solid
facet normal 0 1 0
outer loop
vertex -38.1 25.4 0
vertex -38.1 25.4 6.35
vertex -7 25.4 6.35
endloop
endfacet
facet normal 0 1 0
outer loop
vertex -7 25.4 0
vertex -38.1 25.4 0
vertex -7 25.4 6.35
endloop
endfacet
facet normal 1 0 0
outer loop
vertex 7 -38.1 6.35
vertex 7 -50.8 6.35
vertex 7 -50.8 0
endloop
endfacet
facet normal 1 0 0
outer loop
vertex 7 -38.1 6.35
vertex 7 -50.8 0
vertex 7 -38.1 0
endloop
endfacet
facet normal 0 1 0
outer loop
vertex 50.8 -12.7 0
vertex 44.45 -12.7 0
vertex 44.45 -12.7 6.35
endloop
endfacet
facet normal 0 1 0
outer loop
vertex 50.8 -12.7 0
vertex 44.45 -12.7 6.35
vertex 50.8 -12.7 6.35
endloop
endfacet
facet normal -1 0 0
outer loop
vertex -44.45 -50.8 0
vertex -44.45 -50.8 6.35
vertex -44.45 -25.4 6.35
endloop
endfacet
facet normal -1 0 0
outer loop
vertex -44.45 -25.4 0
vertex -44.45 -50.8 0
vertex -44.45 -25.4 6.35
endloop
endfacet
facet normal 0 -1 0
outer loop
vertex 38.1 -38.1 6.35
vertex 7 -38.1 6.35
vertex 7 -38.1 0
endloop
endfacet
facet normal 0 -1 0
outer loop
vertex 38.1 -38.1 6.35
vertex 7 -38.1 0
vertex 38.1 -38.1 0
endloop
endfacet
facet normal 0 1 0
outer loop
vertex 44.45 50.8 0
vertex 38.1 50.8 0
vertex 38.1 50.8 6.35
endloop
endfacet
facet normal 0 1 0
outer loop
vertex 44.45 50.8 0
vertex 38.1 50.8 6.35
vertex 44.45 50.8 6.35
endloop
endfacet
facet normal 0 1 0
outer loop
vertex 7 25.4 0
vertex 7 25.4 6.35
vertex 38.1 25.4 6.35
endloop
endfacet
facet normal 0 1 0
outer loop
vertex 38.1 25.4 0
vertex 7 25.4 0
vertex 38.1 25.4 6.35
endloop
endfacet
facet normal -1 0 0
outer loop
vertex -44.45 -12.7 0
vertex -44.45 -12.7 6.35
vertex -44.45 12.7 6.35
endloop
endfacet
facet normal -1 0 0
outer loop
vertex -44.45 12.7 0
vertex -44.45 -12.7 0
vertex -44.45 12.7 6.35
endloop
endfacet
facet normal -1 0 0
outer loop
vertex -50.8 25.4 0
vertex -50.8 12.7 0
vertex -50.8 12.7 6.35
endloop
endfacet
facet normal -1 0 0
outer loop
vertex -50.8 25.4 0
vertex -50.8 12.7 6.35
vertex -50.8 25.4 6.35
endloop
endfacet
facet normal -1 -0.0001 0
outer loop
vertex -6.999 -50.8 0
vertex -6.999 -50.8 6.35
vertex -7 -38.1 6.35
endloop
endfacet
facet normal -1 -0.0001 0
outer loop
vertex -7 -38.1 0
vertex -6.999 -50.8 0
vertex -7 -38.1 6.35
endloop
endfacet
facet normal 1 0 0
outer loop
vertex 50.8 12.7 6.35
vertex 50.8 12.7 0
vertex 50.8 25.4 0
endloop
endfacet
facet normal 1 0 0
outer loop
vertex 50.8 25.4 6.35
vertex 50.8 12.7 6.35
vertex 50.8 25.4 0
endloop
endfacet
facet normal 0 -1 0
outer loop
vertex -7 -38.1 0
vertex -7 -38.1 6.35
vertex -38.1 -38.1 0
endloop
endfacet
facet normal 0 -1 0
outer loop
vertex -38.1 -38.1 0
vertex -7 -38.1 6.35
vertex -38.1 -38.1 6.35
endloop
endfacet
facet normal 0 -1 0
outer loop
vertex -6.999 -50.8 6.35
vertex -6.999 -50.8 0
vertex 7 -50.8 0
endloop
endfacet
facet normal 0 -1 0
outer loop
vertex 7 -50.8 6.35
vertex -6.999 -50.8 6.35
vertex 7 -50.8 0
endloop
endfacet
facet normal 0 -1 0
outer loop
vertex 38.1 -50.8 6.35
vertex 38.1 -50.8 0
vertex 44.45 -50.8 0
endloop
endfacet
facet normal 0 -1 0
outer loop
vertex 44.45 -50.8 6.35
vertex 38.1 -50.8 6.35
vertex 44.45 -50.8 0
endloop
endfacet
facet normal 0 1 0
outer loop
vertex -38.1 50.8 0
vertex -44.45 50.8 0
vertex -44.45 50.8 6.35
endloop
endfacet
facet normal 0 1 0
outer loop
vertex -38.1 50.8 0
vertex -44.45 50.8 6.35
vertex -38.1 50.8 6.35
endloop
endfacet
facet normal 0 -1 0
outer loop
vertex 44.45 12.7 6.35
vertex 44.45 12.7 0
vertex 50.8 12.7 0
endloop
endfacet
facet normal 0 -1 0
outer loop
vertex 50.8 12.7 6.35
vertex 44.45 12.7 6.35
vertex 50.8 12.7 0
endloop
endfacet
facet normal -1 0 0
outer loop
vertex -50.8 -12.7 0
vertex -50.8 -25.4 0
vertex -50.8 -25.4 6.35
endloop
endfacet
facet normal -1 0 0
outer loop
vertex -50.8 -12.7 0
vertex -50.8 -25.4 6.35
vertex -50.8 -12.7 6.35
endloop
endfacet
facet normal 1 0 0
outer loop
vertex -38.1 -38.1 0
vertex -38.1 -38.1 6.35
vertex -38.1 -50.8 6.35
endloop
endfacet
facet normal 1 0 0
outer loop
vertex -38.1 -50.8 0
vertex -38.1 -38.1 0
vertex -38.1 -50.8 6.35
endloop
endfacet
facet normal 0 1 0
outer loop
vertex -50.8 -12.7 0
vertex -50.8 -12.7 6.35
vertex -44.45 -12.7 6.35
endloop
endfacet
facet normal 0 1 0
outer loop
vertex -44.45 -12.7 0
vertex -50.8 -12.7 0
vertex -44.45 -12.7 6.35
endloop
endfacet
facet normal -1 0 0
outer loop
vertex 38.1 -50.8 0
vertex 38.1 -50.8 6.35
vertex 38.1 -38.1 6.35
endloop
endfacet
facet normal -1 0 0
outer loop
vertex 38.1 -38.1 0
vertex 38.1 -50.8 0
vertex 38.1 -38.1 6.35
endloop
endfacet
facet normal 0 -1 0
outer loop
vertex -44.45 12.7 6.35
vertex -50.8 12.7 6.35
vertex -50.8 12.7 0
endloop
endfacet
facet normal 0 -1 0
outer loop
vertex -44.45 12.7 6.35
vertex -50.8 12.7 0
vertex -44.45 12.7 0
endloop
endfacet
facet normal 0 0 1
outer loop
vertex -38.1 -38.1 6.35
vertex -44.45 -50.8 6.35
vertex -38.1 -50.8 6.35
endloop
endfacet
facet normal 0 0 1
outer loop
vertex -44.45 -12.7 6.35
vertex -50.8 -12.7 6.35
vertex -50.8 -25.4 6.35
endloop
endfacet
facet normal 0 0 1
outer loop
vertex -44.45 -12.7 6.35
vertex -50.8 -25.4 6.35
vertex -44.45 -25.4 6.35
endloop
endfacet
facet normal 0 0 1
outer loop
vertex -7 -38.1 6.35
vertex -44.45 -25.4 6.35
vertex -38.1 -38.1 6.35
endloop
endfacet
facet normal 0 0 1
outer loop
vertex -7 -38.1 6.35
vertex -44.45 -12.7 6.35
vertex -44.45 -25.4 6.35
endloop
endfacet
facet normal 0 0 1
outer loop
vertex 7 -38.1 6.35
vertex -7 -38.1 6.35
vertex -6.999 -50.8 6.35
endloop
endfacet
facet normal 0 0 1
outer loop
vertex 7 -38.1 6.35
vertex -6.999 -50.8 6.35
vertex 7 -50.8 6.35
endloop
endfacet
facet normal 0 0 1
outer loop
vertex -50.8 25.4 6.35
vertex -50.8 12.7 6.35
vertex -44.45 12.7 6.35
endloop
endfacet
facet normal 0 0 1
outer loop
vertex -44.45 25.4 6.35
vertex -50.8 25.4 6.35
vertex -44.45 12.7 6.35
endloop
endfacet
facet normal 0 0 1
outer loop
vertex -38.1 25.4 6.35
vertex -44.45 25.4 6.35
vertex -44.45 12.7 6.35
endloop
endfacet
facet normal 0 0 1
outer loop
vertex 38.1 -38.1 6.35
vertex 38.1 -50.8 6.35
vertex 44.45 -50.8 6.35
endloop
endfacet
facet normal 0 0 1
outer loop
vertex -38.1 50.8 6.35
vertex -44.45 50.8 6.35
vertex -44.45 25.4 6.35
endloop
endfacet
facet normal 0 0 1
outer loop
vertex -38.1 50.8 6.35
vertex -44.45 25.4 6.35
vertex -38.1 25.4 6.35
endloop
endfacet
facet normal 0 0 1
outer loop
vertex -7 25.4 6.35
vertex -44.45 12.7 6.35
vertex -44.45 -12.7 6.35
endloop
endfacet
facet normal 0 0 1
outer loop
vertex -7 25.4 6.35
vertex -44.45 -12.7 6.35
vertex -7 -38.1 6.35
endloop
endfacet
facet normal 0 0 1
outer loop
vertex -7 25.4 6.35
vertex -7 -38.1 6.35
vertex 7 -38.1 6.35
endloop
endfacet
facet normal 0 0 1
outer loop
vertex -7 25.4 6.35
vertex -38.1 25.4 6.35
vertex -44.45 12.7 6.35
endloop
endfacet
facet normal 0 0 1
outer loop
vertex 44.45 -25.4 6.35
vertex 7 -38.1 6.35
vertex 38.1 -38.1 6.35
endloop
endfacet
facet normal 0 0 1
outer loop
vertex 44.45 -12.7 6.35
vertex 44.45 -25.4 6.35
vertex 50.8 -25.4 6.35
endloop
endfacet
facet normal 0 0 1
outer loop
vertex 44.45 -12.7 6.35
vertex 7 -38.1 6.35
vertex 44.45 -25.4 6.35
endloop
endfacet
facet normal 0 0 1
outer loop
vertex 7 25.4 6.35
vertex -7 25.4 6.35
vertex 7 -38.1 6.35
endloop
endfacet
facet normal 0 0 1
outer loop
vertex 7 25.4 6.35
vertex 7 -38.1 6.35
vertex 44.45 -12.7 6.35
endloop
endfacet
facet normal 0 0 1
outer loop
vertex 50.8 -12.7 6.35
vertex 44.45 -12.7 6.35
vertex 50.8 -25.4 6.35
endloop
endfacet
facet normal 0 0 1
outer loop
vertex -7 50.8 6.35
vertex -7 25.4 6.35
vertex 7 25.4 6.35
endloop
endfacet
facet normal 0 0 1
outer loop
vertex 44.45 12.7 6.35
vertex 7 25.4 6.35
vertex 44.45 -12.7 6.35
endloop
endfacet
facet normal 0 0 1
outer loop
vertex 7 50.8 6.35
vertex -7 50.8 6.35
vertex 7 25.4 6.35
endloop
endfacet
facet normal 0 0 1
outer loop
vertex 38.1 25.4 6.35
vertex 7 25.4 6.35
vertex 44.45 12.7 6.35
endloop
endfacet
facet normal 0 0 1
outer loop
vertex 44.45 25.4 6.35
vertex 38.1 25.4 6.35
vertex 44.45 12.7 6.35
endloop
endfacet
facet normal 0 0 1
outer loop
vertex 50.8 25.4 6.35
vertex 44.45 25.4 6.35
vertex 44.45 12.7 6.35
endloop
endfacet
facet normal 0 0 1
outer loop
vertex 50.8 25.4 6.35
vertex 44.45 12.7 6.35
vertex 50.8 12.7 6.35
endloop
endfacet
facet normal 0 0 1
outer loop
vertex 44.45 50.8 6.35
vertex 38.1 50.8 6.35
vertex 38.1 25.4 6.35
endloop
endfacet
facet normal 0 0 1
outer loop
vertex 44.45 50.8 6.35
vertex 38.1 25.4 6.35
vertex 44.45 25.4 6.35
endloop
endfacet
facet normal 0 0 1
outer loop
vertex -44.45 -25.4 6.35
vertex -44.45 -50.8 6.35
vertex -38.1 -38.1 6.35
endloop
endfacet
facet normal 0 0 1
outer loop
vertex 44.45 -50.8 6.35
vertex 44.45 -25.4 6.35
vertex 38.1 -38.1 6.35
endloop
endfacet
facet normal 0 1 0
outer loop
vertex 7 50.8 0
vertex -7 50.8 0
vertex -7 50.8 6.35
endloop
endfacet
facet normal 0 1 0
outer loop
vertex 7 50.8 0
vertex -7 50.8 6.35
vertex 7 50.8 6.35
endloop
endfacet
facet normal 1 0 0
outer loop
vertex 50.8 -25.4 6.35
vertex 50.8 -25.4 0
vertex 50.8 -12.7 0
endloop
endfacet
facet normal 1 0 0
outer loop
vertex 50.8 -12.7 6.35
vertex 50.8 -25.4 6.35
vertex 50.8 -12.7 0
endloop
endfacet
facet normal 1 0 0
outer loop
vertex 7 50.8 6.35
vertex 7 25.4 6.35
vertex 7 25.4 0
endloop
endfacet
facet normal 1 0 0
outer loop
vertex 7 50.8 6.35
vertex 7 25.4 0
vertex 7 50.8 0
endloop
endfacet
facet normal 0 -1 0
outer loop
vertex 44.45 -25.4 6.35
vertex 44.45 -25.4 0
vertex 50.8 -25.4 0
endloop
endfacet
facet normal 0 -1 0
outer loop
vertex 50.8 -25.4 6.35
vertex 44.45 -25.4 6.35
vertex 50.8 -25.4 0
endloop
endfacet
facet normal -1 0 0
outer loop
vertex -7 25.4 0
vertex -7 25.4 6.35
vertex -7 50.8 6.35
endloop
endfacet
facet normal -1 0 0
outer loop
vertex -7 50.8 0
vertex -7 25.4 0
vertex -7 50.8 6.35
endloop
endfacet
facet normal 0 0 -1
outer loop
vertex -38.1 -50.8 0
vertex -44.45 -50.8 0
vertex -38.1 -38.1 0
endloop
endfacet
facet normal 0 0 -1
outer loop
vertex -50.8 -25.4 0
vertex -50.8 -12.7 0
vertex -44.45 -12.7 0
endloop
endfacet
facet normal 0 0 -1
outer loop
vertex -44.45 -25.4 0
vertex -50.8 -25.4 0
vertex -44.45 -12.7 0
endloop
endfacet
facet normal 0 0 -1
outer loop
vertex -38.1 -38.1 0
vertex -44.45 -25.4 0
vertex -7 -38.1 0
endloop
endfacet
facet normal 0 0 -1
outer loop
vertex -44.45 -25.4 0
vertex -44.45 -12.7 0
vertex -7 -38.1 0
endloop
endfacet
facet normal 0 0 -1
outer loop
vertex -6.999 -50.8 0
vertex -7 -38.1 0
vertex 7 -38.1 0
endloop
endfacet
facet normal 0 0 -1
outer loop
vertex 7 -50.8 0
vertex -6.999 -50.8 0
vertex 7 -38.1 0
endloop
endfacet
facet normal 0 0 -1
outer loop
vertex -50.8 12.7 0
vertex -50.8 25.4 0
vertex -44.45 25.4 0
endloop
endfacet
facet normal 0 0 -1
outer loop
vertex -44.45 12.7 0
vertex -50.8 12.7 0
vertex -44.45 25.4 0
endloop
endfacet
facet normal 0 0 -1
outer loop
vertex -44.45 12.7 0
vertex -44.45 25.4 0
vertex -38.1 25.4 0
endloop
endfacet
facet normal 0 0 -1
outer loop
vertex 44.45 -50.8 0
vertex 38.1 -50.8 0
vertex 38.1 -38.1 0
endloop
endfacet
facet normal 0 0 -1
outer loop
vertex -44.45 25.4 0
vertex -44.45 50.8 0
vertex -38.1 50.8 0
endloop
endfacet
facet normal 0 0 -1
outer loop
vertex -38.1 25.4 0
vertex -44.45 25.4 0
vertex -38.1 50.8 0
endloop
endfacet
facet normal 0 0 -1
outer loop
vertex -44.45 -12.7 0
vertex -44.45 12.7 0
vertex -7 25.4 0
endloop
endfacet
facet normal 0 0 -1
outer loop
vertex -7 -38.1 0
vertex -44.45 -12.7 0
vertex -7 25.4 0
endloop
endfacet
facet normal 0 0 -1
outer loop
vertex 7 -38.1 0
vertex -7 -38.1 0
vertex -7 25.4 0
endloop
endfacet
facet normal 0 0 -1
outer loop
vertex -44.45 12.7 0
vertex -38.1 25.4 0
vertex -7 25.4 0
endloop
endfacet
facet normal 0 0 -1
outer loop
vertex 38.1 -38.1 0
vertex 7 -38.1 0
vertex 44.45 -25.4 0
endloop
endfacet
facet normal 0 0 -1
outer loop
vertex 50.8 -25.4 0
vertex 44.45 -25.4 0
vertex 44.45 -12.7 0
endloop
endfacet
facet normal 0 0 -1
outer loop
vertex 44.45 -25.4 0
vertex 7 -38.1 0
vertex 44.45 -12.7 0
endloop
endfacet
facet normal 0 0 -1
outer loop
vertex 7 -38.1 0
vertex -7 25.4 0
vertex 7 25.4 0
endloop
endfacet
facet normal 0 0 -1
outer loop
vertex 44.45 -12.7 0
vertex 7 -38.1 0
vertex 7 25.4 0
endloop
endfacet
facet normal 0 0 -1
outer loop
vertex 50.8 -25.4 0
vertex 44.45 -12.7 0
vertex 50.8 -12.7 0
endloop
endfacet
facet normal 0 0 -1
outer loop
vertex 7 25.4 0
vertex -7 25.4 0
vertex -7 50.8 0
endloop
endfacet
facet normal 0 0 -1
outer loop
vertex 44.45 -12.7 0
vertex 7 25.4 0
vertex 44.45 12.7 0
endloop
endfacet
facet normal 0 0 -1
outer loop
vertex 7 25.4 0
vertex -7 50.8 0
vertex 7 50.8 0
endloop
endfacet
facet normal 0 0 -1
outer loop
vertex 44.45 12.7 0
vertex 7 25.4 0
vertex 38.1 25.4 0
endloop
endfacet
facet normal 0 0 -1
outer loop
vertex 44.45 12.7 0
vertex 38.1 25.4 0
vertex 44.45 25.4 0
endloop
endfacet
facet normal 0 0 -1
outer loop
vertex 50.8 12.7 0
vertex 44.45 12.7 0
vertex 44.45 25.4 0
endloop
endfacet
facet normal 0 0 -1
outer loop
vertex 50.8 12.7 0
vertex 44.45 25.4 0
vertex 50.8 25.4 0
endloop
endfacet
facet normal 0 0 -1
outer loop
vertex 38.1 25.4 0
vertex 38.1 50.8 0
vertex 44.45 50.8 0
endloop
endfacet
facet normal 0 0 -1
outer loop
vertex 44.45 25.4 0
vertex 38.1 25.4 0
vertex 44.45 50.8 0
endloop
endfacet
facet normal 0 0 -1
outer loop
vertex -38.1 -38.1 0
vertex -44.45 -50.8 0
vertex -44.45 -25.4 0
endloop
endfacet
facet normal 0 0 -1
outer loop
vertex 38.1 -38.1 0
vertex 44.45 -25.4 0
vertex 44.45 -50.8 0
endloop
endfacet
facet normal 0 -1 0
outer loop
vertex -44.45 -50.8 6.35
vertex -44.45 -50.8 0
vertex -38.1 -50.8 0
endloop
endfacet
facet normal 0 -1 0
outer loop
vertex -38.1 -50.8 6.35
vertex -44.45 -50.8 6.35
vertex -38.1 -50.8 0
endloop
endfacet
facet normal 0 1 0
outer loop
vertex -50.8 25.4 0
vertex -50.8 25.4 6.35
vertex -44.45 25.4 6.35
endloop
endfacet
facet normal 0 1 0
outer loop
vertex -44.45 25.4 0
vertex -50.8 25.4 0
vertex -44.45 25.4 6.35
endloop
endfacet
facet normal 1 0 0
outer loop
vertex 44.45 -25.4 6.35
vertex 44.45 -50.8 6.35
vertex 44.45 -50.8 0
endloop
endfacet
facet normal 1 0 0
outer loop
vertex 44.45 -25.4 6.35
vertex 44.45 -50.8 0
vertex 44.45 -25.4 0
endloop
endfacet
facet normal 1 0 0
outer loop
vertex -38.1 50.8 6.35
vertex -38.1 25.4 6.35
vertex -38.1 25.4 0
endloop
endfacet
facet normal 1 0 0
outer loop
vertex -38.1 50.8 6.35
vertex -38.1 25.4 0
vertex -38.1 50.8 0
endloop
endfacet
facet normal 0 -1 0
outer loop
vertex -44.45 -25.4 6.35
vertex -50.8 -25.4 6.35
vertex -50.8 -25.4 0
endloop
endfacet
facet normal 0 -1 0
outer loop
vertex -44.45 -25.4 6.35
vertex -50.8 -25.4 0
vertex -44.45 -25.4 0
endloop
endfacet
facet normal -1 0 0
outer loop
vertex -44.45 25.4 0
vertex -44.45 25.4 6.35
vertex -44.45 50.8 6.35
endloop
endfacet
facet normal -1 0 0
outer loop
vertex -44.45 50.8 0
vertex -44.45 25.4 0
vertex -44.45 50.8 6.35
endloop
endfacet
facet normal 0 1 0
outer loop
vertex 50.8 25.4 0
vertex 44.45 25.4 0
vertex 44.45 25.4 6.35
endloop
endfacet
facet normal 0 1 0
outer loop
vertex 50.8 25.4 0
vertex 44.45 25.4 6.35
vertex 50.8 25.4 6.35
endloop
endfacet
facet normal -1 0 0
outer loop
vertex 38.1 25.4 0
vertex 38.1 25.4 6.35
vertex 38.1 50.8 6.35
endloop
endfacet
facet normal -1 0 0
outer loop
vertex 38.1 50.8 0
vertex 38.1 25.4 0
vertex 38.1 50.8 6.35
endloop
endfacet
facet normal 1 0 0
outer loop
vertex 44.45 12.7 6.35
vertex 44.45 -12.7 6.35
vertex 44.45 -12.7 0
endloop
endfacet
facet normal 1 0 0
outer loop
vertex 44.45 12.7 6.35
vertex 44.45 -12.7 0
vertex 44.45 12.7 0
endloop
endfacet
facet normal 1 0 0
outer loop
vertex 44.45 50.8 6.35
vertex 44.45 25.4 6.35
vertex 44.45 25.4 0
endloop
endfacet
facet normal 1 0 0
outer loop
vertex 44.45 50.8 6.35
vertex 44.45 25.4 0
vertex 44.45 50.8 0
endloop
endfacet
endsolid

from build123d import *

# Parameters (mm, degrees)
SKETCH2_W           = 101.6
SKETCH2_H           = 101.6
BOSS_EXTRUDE3_DEPTH = 6.35
SKETCH3_W           = 6.35
SKETCH3_H           = 25.4
SKETCH3_W_2         = 31.1
SKETCH3_W_3         = 31.100053481
SKETCH3_W_4         = 6.34997326
SKETCH3_H_2         = 25.400000079
SKETCH3_H_3         = 25.399999921
SKETCH3_W_5         = 31.100486926
SKETCH3_H_4         = 12.7
CUT_EXTRUDE1_DEPTH  = 73.122135992


with BuildPart() as part:
    # Sketch2 → Boss-Extrude3 (new body)
    with BuildSketch(Plane.XY):
        Rectangle(SKETCH2_W, SKETCH2_H)
    extrude(amount=BOSS_EXTRUDE3_DEPTH)

    # Sketch3 → Cut-Extrude1 (cut, through all)
    with BuildSketch(Plane.XY.offset(6.35)):
        with Locations((-47.625, 38.1)):
            Rectangle(SKETCH3_W, SKETCH3_H)
        with Locations((-22.55, 38.1)):
            Rectangle(SKETCH3_W_2, SKETCH3_H)
        with Locations((-47.625, 0)):
            Rectangle(SKETCH3_W, SKETCH3_H)
        with Locations((22.550026741, 38.1)):
            Rectangle(SKETCH3_W_3, SKETCH3_H)
        with Locations((-47.625, -38.1)):
            Rectangle(SKETCH3_W, SKETCH3_H)
        with Locations((47.62501337, 38.1)):
            Rectangle(SKETCH3_W_4, SKETCH3_H)
        with Locations((47.62501337, -3.9e-08)):
            Rectangle(SKETCH3_W_4, SKETCH3_H_2)
        Polygon((-7.000486295, -38.1), (-38.1, -38.1), (-38.1, -50.8), (-6.999486151, -50.8), align=None)
        with Locations((47.62501337, -38.10000004)):
            Rectangle(SKETCH3_W_4, SKETCH3_H_3)
        with Locations((22.549757168, -44.45)):
            Rectangle(SKETCH3_W_5, SKETCH3_H_4)
    extrude(amount=-CUT_EXTRUDE1_DEPTH, mode=Mode.SUBTRACT)


solid = part.part
